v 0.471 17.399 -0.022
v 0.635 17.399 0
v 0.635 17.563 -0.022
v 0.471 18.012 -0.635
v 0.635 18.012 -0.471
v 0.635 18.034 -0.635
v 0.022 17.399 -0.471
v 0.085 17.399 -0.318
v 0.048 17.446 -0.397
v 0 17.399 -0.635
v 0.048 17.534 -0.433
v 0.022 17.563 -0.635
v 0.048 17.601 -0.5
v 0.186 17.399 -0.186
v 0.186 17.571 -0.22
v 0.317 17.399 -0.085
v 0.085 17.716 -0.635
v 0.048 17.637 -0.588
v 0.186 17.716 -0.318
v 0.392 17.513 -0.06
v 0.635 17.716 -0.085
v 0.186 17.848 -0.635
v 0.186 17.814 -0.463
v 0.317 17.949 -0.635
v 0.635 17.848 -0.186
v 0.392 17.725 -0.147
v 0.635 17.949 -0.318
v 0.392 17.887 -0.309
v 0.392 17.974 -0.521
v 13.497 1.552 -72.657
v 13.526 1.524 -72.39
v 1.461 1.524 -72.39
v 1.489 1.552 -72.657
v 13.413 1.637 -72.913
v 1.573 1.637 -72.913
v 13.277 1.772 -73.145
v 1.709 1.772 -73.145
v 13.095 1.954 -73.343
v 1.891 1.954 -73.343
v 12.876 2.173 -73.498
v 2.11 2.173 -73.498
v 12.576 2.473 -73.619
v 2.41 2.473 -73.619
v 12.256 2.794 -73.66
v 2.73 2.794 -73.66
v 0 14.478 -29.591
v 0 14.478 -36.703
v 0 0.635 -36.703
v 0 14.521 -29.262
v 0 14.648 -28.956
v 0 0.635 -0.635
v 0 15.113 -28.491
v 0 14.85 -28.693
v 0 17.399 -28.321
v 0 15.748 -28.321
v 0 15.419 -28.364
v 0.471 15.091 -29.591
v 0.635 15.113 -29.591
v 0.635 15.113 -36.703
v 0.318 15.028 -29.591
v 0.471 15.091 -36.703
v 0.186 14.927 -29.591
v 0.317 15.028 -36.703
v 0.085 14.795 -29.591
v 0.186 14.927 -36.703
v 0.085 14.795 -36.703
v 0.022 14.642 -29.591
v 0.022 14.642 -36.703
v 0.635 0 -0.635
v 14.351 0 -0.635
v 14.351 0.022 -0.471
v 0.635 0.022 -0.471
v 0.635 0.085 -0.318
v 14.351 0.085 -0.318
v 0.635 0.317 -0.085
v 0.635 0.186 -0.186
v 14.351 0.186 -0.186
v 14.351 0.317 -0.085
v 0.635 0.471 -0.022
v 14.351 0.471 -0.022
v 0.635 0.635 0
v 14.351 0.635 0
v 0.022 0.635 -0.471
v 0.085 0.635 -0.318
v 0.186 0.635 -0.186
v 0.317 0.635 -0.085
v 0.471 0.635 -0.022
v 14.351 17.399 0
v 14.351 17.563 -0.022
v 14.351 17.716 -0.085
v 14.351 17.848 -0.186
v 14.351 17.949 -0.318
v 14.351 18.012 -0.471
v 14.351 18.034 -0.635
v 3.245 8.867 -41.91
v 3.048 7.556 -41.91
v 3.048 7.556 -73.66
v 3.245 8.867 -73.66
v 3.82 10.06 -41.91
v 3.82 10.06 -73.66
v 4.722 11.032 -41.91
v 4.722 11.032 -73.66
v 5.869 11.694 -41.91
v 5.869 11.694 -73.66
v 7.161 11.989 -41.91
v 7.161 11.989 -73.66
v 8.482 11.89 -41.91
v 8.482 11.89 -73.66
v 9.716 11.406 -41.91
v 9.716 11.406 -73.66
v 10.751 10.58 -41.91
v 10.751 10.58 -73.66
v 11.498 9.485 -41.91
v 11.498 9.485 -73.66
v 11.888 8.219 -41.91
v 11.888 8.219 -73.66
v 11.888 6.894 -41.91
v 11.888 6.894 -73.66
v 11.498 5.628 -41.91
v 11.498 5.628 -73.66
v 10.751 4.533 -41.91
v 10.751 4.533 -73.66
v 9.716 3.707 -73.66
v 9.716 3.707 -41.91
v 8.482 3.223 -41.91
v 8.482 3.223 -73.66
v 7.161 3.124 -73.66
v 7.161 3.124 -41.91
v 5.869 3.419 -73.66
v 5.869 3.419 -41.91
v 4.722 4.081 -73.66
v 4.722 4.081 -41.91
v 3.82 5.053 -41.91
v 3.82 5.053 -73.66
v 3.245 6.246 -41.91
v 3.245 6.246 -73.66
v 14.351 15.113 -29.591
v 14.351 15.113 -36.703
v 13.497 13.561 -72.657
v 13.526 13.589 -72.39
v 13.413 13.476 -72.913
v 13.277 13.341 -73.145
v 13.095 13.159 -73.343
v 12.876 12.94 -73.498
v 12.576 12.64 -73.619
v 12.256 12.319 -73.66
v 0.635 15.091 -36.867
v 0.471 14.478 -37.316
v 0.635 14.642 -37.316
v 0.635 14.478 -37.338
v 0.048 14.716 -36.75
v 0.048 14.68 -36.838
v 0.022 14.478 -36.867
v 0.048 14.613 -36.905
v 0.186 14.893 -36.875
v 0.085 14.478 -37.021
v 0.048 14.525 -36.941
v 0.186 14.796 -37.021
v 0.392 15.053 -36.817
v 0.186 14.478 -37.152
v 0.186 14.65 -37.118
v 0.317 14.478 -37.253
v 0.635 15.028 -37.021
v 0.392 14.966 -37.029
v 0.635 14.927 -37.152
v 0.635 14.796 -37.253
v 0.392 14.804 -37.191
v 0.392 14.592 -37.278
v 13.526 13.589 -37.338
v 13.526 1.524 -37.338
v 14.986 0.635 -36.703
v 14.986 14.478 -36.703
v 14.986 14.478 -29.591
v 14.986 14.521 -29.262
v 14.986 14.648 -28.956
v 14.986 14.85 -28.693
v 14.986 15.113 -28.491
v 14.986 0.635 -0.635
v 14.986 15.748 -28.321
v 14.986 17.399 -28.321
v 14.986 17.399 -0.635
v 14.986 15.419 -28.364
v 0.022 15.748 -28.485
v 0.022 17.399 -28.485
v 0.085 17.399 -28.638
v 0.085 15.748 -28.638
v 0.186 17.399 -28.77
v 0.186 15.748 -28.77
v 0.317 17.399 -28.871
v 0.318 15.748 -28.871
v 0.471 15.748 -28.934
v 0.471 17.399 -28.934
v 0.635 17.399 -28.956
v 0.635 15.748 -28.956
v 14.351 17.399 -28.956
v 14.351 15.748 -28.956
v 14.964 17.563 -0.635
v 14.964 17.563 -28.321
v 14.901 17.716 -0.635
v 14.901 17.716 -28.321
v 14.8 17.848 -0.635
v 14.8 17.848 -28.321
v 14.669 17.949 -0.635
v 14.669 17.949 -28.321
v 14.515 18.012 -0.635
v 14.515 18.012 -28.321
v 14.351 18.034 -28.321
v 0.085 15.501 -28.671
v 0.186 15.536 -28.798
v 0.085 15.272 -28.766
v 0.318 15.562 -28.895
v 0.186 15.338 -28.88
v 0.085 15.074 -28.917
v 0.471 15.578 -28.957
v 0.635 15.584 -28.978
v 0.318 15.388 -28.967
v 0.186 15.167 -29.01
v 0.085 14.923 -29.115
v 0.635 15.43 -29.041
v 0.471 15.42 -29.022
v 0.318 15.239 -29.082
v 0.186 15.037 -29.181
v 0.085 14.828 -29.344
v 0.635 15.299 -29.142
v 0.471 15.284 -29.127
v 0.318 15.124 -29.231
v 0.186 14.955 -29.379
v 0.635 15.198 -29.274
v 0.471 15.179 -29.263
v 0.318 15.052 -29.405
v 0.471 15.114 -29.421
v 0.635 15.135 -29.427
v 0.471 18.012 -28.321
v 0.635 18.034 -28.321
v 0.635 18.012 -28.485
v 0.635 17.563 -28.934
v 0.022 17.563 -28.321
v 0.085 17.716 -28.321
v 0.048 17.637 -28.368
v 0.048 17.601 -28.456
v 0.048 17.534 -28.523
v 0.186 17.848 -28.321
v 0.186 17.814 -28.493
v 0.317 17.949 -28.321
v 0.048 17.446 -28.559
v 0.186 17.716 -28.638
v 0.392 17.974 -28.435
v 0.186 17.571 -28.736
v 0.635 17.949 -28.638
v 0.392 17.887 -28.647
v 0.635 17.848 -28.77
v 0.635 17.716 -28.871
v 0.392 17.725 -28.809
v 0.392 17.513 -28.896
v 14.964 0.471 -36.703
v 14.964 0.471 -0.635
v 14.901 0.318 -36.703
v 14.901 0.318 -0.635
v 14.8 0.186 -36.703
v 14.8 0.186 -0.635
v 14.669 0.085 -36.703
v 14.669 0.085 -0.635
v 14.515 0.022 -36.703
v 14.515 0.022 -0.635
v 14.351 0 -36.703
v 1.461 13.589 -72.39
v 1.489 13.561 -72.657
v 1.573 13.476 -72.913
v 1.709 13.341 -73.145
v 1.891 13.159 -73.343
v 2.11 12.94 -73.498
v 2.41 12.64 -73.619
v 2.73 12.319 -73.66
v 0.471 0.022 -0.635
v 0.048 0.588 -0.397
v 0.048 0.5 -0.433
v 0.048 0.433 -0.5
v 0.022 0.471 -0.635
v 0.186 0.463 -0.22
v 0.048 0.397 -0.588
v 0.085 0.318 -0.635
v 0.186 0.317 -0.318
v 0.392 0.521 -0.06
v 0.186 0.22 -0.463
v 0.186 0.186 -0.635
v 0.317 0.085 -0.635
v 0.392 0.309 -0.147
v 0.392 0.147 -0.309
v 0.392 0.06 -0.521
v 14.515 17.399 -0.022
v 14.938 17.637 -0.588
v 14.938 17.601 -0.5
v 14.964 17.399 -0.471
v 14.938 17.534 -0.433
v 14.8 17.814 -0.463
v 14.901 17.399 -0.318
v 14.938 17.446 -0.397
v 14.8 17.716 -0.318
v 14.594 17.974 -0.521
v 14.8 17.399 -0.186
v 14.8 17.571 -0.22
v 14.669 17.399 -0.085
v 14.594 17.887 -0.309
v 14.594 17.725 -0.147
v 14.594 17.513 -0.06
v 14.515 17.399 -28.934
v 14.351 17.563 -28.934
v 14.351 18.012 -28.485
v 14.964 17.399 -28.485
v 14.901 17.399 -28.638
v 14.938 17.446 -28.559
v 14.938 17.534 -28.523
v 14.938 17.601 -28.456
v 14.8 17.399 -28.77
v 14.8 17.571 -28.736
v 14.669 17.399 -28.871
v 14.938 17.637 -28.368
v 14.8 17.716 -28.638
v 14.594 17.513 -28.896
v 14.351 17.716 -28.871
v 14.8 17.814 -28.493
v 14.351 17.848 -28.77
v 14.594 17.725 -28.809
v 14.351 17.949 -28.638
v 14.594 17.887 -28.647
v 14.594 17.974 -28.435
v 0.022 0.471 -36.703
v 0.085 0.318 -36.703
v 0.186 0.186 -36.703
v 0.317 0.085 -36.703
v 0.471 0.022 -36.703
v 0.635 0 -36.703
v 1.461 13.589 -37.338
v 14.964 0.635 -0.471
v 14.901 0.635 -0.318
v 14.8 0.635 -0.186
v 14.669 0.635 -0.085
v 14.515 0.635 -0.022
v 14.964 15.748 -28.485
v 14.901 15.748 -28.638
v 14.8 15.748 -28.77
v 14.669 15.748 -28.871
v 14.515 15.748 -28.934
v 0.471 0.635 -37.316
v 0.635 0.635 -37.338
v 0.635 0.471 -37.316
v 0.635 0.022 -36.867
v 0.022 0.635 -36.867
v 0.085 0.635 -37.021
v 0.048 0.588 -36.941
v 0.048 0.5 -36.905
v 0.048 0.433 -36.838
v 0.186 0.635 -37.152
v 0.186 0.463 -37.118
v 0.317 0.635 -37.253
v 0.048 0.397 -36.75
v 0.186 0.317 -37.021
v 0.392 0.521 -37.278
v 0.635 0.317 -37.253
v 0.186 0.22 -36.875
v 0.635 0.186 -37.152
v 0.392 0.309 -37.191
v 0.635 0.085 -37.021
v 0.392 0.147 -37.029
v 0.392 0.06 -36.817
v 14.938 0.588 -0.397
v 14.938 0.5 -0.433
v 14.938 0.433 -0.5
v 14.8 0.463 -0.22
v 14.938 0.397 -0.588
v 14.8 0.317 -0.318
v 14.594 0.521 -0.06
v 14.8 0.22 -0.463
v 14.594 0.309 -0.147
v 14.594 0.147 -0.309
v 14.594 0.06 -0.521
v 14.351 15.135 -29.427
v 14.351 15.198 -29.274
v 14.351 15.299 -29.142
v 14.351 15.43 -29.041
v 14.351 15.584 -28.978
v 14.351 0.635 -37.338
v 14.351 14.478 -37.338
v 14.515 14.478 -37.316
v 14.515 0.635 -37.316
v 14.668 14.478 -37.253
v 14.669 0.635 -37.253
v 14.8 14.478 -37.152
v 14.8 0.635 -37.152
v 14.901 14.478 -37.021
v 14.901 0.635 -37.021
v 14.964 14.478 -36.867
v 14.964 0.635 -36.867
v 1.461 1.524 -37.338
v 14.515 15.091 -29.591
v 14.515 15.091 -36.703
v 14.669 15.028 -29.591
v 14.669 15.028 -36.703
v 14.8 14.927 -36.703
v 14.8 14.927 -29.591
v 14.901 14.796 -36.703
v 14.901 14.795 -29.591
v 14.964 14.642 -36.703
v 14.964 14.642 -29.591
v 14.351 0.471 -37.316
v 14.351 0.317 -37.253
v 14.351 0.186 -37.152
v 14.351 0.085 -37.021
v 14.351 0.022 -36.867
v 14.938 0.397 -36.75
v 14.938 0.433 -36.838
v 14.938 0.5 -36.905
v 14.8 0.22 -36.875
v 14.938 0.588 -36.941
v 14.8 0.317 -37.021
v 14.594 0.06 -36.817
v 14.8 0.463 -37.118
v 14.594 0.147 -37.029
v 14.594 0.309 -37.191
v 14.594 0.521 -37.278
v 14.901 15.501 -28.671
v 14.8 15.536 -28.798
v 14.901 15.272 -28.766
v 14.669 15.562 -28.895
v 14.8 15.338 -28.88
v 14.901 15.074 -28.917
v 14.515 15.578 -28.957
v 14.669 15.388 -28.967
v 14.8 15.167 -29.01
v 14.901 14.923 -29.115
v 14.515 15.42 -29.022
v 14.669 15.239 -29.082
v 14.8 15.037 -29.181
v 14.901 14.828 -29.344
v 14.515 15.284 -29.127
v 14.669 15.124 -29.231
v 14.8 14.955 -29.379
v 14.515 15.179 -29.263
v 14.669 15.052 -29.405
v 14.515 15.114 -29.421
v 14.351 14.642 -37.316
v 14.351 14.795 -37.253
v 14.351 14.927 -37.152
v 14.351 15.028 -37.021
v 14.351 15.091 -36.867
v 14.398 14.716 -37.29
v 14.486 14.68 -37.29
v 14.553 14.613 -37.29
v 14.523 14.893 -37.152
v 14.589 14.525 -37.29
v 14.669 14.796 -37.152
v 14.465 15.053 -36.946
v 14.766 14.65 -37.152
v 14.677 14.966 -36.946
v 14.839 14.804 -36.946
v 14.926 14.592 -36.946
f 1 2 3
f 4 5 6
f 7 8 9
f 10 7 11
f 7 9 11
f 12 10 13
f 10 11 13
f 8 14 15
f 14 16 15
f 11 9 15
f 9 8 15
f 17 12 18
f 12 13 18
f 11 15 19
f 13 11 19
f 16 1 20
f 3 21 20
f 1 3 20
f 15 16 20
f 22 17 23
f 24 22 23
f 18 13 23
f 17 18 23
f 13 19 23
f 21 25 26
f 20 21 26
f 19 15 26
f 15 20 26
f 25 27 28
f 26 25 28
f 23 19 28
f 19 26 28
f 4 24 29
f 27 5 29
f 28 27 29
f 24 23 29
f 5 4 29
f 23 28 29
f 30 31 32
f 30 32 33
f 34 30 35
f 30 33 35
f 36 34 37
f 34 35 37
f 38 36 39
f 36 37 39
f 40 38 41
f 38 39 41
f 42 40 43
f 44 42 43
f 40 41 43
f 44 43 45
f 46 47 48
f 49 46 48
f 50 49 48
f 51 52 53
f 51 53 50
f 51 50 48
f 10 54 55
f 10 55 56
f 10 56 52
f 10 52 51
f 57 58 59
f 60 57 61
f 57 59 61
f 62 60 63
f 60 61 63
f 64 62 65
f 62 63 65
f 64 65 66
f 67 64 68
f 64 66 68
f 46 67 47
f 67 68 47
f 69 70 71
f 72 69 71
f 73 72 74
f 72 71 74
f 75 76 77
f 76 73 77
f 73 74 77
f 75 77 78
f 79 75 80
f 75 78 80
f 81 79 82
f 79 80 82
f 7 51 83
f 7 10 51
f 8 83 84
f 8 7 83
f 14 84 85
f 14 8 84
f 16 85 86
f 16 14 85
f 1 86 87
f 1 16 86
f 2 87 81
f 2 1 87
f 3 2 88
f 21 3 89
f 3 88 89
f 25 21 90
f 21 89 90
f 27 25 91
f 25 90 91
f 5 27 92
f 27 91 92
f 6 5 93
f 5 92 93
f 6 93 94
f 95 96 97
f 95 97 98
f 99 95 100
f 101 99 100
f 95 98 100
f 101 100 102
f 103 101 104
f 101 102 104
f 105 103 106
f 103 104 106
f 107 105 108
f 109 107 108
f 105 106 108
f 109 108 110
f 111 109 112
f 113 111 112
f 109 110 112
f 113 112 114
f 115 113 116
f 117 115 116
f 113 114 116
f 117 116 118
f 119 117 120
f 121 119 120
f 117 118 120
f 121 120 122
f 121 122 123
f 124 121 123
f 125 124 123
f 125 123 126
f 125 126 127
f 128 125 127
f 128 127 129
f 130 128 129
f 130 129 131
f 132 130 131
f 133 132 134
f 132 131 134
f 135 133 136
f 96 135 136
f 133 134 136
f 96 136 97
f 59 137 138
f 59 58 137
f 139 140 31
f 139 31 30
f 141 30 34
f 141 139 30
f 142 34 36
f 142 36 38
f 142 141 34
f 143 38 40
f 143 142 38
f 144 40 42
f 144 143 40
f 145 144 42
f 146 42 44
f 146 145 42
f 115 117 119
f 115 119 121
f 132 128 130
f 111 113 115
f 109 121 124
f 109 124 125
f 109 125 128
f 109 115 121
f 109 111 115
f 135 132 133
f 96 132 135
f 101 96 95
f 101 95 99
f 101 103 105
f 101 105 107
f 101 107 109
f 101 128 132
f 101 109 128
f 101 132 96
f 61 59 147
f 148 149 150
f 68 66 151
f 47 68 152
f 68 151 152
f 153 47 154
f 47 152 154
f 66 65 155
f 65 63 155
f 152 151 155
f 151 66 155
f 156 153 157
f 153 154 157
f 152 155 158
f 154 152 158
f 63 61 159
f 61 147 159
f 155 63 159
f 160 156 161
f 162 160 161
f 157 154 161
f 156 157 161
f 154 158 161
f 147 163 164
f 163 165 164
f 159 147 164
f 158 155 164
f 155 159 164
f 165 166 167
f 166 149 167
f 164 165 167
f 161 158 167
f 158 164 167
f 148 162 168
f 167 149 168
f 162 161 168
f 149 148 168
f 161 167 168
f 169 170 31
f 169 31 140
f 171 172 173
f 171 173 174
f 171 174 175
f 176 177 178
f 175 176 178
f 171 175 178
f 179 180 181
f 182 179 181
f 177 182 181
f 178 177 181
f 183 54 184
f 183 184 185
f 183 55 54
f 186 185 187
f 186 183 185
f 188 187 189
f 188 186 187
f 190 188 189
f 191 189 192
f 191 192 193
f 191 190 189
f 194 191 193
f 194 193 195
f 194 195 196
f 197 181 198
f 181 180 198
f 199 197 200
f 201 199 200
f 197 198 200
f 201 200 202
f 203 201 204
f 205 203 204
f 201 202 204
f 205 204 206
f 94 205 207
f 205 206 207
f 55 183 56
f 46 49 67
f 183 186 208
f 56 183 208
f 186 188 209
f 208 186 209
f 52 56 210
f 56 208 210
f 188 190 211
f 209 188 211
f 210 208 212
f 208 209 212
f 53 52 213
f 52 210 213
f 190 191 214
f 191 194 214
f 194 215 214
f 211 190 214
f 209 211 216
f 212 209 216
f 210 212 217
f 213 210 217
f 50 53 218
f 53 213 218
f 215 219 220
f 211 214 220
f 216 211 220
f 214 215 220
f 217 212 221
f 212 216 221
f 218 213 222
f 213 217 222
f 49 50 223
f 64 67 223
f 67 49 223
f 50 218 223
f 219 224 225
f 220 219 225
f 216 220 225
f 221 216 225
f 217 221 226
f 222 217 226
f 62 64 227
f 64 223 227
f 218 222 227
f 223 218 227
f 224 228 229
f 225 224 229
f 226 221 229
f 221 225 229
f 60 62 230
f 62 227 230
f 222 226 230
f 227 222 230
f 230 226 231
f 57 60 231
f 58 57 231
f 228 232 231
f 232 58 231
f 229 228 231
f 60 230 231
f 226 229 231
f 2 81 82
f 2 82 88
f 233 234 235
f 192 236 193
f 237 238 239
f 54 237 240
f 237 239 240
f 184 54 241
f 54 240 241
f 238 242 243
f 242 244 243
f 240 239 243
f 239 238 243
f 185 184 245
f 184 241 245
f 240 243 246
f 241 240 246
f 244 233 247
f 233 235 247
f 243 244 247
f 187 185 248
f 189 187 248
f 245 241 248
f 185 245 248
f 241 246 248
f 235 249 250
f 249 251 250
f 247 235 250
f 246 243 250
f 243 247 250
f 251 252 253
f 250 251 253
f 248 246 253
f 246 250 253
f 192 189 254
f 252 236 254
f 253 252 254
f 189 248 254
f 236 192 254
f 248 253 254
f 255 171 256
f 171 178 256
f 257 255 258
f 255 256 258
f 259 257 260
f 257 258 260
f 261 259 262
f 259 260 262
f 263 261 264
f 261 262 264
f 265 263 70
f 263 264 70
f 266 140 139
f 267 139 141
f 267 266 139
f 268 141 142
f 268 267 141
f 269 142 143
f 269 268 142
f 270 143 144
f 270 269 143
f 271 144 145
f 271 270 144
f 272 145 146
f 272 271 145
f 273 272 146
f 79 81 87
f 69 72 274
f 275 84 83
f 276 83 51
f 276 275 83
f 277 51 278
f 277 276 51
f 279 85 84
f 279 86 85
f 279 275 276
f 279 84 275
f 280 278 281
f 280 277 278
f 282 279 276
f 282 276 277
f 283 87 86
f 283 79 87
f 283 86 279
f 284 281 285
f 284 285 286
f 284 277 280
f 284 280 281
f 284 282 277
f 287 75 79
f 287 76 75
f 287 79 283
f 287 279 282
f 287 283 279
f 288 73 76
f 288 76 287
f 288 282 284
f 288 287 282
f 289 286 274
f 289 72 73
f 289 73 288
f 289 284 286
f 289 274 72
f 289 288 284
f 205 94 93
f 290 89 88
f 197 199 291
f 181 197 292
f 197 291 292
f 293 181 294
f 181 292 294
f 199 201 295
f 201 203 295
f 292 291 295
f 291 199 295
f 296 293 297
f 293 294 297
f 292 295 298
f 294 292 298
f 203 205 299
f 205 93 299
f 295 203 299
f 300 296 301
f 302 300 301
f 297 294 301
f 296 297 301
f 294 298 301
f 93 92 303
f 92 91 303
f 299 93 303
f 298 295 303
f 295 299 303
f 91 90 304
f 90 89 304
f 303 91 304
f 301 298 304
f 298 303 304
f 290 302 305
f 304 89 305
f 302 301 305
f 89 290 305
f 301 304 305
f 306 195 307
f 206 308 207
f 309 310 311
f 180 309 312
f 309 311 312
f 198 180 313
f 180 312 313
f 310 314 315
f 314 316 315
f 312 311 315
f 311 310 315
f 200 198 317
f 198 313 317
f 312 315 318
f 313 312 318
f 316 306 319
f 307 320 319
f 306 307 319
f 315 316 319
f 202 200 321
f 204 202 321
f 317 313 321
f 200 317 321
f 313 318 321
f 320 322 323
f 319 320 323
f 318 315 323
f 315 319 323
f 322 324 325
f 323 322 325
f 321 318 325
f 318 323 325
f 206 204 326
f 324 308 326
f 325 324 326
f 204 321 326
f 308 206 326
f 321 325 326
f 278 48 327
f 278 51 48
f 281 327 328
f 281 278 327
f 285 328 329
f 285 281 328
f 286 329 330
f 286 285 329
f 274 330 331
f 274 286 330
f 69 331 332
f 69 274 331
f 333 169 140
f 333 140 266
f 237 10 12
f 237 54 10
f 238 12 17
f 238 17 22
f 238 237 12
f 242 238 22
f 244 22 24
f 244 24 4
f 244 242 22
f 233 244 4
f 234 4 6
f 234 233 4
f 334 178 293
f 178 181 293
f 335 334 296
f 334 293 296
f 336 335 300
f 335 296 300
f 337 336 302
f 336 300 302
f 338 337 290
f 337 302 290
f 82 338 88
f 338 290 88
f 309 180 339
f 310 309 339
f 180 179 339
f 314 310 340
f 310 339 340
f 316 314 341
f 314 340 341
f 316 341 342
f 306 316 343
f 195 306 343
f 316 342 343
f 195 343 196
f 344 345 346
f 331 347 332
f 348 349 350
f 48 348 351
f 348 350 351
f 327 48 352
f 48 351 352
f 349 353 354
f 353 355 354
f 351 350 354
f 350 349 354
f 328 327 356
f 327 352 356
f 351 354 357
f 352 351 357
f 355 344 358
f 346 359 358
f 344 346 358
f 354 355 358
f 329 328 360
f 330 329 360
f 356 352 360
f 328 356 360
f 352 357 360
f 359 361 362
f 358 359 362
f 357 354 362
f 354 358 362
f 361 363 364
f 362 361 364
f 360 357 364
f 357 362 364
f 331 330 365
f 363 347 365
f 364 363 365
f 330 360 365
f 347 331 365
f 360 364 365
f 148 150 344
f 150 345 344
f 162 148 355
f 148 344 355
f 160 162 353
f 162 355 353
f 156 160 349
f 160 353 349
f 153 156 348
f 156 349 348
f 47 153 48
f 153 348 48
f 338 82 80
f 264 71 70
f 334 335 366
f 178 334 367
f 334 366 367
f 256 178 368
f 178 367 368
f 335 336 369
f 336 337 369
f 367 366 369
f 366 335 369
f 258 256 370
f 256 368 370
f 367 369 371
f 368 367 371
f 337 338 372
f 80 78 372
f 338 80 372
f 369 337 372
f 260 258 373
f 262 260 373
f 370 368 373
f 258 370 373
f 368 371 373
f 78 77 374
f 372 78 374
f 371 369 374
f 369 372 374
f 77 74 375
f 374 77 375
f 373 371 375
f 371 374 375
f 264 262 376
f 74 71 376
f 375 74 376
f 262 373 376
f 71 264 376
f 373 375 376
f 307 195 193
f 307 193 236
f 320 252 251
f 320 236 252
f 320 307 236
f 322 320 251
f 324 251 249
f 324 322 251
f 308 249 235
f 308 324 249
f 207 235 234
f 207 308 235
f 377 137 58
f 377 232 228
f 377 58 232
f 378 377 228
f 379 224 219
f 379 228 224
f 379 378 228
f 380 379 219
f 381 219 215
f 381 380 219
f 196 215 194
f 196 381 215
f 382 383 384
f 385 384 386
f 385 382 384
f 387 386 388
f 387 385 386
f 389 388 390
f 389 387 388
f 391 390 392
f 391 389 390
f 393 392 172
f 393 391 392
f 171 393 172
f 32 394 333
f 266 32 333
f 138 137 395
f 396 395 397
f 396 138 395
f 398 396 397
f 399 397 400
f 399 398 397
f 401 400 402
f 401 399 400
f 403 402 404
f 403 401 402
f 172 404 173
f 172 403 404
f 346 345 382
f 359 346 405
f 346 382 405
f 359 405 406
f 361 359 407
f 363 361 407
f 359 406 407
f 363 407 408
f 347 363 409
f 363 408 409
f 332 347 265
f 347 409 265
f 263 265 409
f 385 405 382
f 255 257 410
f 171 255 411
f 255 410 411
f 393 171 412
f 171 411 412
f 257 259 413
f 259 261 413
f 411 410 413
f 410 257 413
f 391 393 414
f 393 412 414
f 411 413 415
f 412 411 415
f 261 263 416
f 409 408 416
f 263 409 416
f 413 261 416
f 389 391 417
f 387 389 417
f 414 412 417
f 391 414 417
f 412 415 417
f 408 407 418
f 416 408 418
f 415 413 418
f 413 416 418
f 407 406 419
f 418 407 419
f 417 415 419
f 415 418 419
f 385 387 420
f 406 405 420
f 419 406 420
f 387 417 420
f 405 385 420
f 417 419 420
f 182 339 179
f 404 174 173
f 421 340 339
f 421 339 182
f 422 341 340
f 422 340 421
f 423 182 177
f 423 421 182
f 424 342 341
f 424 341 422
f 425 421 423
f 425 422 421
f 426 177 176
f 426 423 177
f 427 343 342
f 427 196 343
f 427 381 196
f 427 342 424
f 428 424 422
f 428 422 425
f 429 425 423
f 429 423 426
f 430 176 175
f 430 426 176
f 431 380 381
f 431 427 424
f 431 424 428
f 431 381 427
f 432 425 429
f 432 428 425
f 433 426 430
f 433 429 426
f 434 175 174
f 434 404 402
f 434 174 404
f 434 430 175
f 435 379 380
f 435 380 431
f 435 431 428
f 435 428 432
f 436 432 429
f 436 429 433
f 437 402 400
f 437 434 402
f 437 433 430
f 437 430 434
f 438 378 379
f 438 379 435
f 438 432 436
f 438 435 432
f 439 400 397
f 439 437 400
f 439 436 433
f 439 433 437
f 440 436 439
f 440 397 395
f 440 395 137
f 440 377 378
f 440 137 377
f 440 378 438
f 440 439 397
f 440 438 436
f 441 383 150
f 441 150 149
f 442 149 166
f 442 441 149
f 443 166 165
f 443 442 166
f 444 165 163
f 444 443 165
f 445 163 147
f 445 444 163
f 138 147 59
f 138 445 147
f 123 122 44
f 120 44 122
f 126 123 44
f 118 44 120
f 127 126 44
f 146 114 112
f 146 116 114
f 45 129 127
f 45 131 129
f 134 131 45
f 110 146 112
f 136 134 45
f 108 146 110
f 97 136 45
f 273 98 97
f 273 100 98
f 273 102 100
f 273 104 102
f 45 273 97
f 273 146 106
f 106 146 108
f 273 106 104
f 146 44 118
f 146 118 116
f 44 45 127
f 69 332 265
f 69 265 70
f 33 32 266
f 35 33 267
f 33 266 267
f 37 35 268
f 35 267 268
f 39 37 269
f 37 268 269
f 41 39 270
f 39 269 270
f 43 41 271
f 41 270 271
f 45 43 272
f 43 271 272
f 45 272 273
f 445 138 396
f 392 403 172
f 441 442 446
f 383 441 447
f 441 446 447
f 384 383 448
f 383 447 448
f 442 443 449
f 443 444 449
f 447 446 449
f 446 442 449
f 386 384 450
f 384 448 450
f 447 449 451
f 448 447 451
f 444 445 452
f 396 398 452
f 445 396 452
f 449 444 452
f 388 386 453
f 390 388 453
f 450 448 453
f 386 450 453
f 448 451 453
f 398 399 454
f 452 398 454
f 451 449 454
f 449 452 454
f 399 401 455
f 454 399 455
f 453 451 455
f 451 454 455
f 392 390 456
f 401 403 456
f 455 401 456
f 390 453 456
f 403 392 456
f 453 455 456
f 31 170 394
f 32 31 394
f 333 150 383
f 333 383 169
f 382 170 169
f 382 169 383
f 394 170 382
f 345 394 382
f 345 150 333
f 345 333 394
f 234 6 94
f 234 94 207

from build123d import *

# Parameters (mm, degrees)
BOSS_EXTRUDE1_DEPTH = 14.986
SKETCH2_W           = 12.065
SKETCH2_H           = 12.065
BOSS_EXTRUDE2_DEPTH = 36.322
FILLET1_R           = 1.27
FILLET2_R           = 0.635
SKETCH3_R           = 4.445
CUT_EXTRUDE1_DEPTH  = 31.75


with BuildPart() as part:
    # Sketch1 → Boss-Extrude1 (new body)
    with BuildSketch(Plane(origin=(0, 0, 0), x_dir=(0, 0, -1), z_dir=(1, 0, 0))):
        Polygon((0, 0), (0, 18.034), (28.956, 18.034), (28.956, 15.113), (37.338, 15.113), (37.338, 0), align=None)
    extrude(amount=BOSS_EXTRUDE1_DEPTH)

    # Sketch2 → Boss-Extrude2 (add)
    with BuildSketch(Plane(origin=(0, 0, -37.338), x_dir=(-1, 0, 0), z_dir=(0, 0, -1))):
        with Locations((-7.493, 7.5565)):
            Rectangle(SKETCH2_W, SKETCH2_H)
    extrude(amount=BOSS_EXTRUDE2_DEPTH)

    # Fillet1
    fillet1_edges = [part.edges().sort_by_distance(p)[0] for p in [
        (1.4605, 7.5565, -73.66),
        (7.493, 13.589, -73.66),
        (13.5255, 7.5565, -73.66),
        (7.493, 1.524, -73.66),
    ]]
    fillet(fillet1_edges, radius=FILLET1_R)

    # Fillet2
    fillet2_edges = [part.edges().sort_by_distance(p)[0] for p in [
        (14.986, 15.113, -33.147),
        (7.493, 0, 0),
        (7.493, 18.034, 0),
        (7.493, 18.034, -28.956),
        (7.493, 15.113, -28.956),
        (7.493, 15.113, -37.338),
        (7.493, 0, -37.338),
        (14.986, 16.5735, -28.956),
        (14.986, 18.034, -14.478),
        (14.986, 9.017, 0),
        (14.986, 0, -18.669),
        (0, 9.017, 0),
        (0, 18.034, -14.478),
        (0, 16.5735, -28.956),
        (14.986, 7.5565, -37.338),
        (0, 15.113, -33.147),
        (0, 7.5565, -37.338),
        (0, 0, -18.669),
    ]]
    fillet(fillet2_edges, radius=FILLET2_R)

    # Sketch3 → Cut-Extrude1 (cut)
    with BuildSketch(Plane(origin=(0, 0, -73.66), x_dir=(-1, 0, 0), z_dir=(0, 0, -1))):
        with Locations((-7.493, 7.5565)):
            Circle(SKETCH3_R)
    extrude(amount=-CUT_EXTRUDE1_DEPTH, mode=Mode.SUBTRACT)


solid = part.part
